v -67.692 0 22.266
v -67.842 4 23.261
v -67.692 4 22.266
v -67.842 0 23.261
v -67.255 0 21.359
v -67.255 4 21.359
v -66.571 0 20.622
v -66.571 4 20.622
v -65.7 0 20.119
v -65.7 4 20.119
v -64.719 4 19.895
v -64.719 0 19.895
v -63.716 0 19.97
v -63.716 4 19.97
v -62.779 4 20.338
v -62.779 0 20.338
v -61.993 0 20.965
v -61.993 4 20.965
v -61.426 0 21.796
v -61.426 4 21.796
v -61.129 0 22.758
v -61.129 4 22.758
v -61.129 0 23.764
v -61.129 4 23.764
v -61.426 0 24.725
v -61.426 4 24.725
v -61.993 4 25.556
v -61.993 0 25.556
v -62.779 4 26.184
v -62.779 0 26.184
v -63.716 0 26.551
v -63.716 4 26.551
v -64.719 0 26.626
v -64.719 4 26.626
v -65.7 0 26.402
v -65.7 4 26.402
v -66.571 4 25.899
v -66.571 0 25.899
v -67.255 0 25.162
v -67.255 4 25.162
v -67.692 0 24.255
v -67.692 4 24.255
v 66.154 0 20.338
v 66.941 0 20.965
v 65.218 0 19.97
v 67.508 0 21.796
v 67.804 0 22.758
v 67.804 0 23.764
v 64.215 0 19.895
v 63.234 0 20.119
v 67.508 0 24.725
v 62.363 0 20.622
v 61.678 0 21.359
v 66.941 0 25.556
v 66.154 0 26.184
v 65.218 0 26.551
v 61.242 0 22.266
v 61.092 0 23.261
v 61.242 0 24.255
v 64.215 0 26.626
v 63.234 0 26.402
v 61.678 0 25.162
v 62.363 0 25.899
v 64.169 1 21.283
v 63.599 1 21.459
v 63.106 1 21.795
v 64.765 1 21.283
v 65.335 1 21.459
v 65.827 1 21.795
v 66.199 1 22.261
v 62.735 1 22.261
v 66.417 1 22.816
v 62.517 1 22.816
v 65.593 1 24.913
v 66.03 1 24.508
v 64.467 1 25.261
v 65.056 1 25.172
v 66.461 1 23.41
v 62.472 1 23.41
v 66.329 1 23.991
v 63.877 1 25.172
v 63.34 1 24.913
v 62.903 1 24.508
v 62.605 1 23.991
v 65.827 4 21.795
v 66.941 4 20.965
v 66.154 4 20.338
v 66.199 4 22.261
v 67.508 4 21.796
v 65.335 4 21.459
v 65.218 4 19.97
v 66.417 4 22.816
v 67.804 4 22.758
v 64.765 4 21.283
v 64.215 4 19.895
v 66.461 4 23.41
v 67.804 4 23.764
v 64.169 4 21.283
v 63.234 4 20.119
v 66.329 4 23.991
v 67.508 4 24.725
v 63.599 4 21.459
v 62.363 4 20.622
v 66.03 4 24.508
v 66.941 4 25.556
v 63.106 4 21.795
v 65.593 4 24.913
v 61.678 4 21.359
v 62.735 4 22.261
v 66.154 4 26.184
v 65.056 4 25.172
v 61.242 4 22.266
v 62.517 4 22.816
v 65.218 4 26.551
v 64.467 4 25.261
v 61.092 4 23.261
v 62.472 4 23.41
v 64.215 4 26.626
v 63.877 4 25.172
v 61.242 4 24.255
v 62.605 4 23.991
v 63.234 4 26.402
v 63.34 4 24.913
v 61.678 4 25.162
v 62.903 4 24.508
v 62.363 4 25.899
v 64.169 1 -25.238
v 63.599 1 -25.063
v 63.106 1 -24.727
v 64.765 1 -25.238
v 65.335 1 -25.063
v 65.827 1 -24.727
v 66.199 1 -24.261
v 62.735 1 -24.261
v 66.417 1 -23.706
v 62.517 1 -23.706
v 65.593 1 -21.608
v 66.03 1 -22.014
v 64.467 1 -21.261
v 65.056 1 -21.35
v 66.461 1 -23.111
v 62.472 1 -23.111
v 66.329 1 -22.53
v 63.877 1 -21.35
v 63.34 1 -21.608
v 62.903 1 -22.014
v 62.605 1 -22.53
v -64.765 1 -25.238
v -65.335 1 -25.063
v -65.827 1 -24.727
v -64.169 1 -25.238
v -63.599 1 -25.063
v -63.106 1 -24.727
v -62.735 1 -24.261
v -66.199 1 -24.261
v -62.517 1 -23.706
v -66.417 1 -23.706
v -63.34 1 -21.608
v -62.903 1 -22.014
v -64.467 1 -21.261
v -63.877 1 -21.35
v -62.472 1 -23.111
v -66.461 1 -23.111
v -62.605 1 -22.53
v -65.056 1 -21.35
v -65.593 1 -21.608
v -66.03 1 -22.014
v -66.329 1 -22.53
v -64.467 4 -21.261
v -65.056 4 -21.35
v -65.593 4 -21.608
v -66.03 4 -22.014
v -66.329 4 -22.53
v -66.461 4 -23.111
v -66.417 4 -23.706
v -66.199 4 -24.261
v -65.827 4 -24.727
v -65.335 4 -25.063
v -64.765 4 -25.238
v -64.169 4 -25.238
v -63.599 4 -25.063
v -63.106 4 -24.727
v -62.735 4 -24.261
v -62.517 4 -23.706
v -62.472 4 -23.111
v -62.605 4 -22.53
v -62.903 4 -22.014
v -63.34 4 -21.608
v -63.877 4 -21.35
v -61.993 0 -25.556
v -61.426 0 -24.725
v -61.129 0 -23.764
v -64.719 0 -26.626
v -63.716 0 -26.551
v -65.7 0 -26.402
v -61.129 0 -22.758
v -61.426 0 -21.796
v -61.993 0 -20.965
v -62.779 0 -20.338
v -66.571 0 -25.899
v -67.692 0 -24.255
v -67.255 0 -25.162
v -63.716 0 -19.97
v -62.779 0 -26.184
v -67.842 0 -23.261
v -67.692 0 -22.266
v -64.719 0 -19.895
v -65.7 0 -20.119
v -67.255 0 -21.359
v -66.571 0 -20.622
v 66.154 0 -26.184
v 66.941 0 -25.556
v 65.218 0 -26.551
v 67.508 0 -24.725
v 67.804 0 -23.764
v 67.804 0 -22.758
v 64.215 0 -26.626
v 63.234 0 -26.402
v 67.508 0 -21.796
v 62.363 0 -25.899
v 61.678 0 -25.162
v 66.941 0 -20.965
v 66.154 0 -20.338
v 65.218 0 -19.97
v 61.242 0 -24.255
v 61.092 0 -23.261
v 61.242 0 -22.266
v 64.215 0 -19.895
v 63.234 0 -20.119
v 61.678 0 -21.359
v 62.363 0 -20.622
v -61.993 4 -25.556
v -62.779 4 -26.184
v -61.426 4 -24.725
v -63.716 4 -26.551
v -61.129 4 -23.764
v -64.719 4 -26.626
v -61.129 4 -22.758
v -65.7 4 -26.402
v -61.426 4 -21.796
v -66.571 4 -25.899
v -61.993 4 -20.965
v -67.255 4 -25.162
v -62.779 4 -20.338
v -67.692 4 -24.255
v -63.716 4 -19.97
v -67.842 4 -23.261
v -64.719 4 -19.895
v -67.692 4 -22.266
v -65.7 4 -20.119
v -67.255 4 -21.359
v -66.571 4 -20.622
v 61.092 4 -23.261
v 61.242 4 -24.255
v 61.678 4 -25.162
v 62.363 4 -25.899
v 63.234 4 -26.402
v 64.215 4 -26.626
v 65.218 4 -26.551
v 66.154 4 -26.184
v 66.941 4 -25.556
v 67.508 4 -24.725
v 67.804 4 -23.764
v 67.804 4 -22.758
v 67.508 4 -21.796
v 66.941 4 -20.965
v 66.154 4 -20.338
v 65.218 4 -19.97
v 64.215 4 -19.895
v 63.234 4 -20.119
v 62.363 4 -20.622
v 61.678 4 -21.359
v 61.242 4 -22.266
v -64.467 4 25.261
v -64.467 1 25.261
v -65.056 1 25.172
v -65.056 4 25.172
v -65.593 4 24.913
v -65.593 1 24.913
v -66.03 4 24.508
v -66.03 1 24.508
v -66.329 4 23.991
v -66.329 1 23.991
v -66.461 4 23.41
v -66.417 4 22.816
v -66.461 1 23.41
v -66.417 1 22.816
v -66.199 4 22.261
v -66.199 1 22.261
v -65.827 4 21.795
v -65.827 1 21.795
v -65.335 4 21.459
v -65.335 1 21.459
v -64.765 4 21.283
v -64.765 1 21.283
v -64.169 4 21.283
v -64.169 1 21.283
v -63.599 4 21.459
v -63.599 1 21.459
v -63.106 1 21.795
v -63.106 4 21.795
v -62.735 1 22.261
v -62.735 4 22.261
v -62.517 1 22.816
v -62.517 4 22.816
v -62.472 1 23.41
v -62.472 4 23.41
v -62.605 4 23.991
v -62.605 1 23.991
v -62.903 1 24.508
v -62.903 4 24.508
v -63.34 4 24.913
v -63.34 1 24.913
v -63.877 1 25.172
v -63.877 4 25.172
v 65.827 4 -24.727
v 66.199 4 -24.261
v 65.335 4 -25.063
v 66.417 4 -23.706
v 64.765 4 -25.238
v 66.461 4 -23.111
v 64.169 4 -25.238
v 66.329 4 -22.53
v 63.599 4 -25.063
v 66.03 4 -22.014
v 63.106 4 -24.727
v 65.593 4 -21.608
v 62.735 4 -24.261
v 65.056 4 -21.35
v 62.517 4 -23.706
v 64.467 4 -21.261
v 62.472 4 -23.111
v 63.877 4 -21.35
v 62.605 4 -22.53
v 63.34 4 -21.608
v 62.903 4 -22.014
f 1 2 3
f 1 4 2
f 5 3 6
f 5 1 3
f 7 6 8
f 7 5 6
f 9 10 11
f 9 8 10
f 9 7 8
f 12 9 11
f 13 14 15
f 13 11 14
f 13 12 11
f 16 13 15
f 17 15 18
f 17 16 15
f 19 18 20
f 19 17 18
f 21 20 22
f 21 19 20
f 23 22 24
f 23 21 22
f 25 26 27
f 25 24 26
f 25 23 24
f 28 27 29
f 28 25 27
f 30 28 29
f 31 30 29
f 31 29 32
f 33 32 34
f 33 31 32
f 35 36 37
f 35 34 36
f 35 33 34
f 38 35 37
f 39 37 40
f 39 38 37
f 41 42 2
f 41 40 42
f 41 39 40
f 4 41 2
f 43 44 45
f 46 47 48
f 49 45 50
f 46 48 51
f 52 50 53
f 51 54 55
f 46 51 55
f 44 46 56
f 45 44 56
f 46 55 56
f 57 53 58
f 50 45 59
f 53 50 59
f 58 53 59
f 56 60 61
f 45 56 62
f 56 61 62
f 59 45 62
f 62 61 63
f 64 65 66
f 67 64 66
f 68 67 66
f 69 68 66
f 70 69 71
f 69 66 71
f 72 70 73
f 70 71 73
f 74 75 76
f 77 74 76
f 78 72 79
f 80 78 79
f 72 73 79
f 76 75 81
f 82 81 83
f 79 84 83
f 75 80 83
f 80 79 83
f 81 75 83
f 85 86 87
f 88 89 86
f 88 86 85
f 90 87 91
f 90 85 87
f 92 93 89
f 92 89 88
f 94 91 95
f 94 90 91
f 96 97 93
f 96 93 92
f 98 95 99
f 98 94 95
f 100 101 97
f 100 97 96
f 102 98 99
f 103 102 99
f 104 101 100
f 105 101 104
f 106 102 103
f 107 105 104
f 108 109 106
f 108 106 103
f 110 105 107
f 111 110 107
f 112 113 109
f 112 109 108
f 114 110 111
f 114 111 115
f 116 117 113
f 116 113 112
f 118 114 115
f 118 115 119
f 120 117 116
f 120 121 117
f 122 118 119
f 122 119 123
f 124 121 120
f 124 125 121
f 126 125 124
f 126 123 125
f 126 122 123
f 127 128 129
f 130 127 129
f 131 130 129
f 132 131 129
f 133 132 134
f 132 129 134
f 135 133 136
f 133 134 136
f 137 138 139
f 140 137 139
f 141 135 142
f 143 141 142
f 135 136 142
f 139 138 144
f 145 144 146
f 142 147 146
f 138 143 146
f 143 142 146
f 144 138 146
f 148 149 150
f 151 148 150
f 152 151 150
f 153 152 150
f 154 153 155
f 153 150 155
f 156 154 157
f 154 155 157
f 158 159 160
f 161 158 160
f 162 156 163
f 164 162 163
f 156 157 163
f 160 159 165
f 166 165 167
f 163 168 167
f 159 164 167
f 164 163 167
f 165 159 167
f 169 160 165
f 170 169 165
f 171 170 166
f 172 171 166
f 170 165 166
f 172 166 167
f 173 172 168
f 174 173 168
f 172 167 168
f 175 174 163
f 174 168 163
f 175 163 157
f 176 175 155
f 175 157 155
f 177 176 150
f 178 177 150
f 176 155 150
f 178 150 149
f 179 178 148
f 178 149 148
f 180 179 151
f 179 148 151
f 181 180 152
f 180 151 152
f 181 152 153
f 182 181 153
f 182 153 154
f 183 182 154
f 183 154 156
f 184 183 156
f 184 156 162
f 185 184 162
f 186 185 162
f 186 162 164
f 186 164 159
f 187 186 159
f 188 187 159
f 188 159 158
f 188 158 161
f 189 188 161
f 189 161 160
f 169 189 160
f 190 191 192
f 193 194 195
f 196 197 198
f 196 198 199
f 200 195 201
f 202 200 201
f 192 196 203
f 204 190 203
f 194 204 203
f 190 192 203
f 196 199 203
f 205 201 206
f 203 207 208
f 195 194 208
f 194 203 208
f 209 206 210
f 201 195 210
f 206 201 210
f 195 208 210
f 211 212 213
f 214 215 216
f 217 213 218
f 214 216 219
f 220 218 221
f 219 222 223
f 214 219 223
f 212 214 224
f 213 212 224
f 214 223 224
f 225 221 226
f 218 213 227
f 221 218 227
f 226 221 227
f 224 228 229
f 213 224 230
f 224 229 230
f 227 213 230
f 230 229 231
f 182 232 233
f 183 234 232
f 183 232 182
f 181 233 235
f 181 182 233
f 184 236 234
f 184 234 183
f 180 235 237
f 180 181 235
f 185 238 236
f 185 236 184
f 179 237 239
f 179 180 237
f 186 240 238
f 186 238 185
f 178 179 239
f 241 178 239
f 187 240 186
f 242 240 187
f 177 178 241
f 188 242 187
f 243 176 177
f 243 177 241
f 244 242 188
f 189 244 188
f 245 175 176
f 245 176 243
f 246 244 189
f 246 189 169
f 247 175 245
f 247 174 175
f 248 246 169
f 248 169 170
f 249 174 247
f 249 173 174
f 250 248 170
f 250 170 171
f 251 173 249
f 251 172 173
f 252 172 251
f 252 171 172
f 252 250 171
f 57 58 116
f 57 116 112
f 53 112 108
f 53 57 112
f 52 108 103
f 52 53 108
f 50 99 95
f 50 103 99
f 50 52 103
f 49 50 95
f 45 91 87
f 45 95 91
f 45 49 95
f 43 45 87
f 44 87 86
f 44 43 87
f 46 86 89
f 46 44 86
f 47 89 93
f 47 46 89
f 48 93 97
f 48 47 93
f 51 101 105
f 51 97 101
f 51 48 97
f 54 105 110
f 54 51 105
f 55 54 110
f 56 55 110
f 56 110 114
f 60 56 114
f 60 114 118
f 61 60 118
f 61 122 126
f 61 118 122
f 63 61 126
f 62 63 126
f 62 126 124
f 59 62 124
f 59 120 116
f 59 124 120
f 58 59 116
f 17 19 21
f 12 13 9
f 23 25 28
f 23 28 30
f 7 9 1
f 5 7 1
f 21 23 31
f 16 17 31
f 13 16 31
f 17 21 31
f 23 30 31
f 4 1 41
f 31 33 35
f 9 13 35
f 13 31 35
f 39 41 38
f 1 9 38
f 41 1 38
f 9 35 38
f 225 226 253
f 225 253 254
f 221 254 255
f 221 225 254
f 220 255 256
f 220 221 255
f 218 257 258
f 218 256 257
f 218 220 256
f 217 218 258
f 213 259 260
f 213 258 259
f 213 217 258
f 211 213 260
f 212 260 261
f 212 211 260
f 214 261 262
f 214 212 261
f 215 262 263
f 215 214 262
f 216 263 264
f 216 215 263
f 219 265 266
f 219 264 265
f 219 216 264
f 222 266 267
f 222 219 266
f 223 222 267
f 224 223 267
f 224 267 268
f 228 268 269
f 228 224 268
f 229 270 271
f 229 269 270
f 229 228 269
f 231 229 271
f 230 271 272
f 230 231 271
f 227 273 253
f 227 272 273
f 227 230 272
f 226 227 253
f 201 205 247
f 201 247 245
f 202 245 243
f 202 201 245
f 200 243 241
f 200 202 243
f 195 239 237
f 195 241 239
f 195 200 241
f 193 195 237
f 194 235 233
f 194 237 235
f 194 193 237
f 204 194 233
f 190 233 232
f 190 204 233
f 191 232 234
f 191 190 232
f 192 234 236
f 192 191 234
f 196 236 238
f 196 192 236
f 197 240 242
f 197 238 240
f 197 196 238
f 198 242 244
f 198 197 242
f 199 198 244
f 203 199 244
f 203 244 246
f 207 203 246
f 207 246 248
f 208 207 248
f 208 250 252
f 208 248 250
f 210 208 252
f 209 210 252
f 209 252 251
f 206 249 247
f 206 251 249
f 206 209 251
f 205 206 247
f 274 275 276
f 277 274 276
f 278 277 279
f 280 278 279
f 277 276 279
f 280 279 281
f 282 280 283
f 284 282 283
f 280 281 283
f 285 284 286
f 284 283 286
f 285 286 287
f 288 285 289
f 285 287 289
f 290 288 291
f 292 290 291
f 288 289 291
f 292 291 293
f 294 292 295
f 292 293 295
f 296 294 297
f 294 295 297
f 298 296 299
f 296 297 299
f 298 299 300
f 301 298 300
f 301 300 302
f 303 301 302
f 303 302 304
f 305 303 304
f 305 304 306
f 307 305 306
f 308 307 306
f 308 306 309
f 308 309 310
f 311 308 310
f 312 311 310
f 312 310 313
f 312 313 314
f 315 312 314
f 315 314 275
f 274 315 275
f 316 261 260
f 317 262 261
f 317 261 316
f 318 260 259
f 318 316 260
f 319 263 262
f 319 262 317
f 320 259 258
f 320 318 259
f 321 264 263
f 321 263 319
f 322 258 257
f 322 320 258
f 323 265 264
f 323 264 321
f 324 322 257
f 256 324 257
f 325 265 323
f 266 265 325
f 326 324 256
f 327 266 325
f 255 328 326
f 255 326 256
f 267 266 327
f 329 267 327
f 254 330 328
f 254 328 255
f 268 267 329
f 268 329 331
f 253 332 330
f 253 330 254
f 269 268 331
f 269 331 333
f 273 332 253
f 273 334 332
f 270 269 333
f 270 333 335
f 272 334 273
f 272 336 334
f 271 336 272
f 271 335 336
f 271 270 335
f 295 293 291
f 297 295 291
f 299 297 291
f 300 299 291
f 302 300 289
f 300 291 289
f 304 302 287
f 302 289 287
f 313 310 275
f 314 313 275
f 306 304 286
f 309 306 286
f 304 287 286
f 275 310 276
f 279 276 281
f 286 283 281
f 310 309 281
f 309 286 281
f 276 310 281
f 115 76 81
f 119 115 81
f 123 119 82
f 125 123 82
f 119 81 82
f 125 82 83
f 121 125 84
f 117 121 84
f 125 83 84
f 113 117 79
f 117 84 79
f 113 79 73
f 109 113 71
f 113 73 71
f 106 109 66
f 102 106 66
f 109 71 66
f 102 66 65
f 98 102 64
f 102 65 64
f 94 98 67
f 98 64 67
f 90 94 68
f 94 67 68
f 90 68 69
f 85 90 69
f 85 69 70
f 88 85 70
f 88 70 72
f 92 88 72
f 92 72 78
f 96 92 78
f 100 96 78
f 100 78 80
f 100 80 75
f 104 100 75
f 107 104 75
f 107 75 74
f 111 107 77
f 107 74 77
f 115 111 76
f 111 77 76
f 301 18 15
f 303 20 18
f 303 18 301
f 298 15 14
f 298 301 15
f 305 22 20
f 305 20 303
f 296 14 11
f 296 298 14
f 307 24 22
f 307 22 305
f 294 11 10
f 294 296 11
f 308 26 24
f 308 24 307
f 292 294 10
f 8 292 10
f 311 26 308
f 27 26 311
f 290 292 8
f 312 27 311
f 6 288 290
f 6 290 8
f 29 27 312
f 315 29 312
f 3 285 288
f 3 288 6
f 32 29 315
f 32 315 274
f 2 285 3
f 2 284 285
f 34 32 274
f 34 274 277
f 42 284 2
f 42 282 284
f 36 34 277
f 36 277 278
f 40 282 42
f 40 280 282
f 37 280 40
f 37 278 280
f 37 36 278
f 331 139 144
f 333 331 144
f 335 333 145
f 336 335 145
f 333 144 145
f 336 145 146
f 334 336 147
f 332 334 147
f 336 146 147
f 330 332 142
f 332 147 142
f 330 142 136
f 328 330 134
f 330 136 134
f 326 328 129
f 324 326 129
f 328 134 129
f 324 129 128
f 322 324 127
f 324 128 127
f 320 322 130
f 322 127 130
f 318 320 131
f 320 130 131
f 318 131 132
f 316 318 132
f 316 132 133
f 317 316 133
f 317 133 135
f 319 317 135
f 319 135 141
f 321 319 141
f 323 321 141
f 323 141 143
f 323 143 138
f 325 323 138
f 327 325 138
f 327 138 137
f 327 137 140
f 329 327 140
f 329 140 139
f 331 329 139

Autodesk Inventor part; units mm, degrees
ref_plane "YZ Plane" through (0, 0, 0) normal (1, 0, 0) x (0, 1, 0)
ref_plane "XZ Plane" through (0, 0, 0) normal (0, 1, 0) x (-1, 0, 0)
ref_plane "XY Plane" through (0, 0, 0) normal (0, 0, 1) x (1, 0, 0)
sketch "Relay Hole Layout" plane through (0, 0, 0) normal (0, 1, 0) x (-1, 0, 0)
  line L0 (64.4668, 23.2607) -> (-64.4668, 23.2607) construction
  line L1 (-64.4668, 23.2607) -> (-64.4668, -23.2607) construction
  line L2 (-64.4668, -23.2607) -> (64.4668, -23.2607) construction
  line L3 (64.4668, -23.2607) -> (64.4668, 23.2607) construction
  line L4 (64.4668, 23.2607) -> (-64.4668, -23.2607) construction
  line L5 (-64.4668, 23.2607) -> (64.4668, -23.2607) construction
  circle A0 centre (64.4668, -23.2607) radius 1.625 construction
  line L6 (0, -23.2607) -> (0, 23.2607) construction
  line L7 (64.4668, 0) -> (-64.4668, 0) construction
  circle A1 centre (-64.4668, -23.2607) radius 1.625 construction
  circle A2 centre (64.4668, 23.2607) radius 1.625 construction
  circle A3 centre (-64.4668, 23.2607) radius 1.625 construction
  line L8 (67.4918, -26.2857) -> (-67.4918, -26.2857) construction
  line L9 (-67.4918, -26.2857) -> (-67.4918, 26.2857) construction
  line L10 (-67.4918, 26.2857) -> (67.4918, 26.2857) construction
  line L11 (67.4918, 26.2857) -> (67.4918, -26.2857) construction
  line L12 (66.0918, -23.2607) -> (67.4918, -23.2607) construction
  line L13 (-64.4668, 24.8857) -> (-64.4668, 26.2857) construction
  line L14 (-66.0918, 23.2607) -> (-67.4918, 23.2607) construction
  point P0 (0, 0)
  dimension "d2" = 3.25
  dimension "d0" = 46.5214
  dimension "d1" = 128.9336
  dimension "d5" = 1.4
  dimension "d6" = 1.4
  dimension "d7" = 1.4
  dimension "d8" = 1.4
sketch "Sketch2" plane through (0, 0, 0) normal (0, 1, 0) x (-1, 0, 0)
  circle A0 centre (64.4668, -23.2607) radius 1.625 construction
  circle A1 centre (-64.4668, -23.2607) radius 1.625 construction
  circle A2 centre (-64.4668, 23.2607) radius 1.625 construction
  circle A3 centre (64.4668, 23.2607) radius 1.625 construction
  circle A4 centre (64.4668, -23.2607) radius 3.375
  circle A5 centre (-64.4668, -23.2607) radius 3.375
  circle A6 centre (-64.4668, 23.2607) radius 3.375
  circle A7 centre (64.4668, 23.2607) radius 3.375
  point P0 (0, 0)
  dimension "d9" = 1.75
extrude "Extrusion2" add sketch "Sketch2" along normal blind 4
sketch "Sketch3" plane through (-64.4668, 4, -23.2607) normal (0, 1, 0) x (1, 0, 0)
  circle A0 centre (0, 0) radius 3.375 projected
  circle A1 centre (128.9336, 0) radius 3.375 projected
  circle A2 centre (128.9336, -46.5214) radius 3.375 projected
  circle A3 centre (0, -46.5214) radius 3.375 projected
  point P0 (64.4668, -23.2607)
hole "Hole1" at (-64.4668, 4, -23.2607) at (64.4668, 4, -23.2607) at (64.4668, 4, 23.2607) at (-64.4668, 4, 23.2607) direction (0, -1, 0) diameter 4 depth 3
sketch "Sketch4" plane through (-64.4668, 0, -23.2607) normal (0, -1, 0) x (1, 0, 0)
  circle A0 centre (0, 0) radius 2 construction
  circle A1 centre (0, 46.5214) radius 2 construction
  circle A2 centre (128.9336, 46.5214) radius 3.375 construction
  circle A3 centre (128.9336, 0) radius 2 construction
  line L0 (0, 0) -> (128.9336, 0) construction
  circle A4 centre (0, 46.5214) radius 3.375 construction
  line L1 (0, 46.5214) -> (128.9336, 46.5214) construction
  point P0 (64.4668, 23.2607)
properties part number "relay_module_standoffs_plate"
